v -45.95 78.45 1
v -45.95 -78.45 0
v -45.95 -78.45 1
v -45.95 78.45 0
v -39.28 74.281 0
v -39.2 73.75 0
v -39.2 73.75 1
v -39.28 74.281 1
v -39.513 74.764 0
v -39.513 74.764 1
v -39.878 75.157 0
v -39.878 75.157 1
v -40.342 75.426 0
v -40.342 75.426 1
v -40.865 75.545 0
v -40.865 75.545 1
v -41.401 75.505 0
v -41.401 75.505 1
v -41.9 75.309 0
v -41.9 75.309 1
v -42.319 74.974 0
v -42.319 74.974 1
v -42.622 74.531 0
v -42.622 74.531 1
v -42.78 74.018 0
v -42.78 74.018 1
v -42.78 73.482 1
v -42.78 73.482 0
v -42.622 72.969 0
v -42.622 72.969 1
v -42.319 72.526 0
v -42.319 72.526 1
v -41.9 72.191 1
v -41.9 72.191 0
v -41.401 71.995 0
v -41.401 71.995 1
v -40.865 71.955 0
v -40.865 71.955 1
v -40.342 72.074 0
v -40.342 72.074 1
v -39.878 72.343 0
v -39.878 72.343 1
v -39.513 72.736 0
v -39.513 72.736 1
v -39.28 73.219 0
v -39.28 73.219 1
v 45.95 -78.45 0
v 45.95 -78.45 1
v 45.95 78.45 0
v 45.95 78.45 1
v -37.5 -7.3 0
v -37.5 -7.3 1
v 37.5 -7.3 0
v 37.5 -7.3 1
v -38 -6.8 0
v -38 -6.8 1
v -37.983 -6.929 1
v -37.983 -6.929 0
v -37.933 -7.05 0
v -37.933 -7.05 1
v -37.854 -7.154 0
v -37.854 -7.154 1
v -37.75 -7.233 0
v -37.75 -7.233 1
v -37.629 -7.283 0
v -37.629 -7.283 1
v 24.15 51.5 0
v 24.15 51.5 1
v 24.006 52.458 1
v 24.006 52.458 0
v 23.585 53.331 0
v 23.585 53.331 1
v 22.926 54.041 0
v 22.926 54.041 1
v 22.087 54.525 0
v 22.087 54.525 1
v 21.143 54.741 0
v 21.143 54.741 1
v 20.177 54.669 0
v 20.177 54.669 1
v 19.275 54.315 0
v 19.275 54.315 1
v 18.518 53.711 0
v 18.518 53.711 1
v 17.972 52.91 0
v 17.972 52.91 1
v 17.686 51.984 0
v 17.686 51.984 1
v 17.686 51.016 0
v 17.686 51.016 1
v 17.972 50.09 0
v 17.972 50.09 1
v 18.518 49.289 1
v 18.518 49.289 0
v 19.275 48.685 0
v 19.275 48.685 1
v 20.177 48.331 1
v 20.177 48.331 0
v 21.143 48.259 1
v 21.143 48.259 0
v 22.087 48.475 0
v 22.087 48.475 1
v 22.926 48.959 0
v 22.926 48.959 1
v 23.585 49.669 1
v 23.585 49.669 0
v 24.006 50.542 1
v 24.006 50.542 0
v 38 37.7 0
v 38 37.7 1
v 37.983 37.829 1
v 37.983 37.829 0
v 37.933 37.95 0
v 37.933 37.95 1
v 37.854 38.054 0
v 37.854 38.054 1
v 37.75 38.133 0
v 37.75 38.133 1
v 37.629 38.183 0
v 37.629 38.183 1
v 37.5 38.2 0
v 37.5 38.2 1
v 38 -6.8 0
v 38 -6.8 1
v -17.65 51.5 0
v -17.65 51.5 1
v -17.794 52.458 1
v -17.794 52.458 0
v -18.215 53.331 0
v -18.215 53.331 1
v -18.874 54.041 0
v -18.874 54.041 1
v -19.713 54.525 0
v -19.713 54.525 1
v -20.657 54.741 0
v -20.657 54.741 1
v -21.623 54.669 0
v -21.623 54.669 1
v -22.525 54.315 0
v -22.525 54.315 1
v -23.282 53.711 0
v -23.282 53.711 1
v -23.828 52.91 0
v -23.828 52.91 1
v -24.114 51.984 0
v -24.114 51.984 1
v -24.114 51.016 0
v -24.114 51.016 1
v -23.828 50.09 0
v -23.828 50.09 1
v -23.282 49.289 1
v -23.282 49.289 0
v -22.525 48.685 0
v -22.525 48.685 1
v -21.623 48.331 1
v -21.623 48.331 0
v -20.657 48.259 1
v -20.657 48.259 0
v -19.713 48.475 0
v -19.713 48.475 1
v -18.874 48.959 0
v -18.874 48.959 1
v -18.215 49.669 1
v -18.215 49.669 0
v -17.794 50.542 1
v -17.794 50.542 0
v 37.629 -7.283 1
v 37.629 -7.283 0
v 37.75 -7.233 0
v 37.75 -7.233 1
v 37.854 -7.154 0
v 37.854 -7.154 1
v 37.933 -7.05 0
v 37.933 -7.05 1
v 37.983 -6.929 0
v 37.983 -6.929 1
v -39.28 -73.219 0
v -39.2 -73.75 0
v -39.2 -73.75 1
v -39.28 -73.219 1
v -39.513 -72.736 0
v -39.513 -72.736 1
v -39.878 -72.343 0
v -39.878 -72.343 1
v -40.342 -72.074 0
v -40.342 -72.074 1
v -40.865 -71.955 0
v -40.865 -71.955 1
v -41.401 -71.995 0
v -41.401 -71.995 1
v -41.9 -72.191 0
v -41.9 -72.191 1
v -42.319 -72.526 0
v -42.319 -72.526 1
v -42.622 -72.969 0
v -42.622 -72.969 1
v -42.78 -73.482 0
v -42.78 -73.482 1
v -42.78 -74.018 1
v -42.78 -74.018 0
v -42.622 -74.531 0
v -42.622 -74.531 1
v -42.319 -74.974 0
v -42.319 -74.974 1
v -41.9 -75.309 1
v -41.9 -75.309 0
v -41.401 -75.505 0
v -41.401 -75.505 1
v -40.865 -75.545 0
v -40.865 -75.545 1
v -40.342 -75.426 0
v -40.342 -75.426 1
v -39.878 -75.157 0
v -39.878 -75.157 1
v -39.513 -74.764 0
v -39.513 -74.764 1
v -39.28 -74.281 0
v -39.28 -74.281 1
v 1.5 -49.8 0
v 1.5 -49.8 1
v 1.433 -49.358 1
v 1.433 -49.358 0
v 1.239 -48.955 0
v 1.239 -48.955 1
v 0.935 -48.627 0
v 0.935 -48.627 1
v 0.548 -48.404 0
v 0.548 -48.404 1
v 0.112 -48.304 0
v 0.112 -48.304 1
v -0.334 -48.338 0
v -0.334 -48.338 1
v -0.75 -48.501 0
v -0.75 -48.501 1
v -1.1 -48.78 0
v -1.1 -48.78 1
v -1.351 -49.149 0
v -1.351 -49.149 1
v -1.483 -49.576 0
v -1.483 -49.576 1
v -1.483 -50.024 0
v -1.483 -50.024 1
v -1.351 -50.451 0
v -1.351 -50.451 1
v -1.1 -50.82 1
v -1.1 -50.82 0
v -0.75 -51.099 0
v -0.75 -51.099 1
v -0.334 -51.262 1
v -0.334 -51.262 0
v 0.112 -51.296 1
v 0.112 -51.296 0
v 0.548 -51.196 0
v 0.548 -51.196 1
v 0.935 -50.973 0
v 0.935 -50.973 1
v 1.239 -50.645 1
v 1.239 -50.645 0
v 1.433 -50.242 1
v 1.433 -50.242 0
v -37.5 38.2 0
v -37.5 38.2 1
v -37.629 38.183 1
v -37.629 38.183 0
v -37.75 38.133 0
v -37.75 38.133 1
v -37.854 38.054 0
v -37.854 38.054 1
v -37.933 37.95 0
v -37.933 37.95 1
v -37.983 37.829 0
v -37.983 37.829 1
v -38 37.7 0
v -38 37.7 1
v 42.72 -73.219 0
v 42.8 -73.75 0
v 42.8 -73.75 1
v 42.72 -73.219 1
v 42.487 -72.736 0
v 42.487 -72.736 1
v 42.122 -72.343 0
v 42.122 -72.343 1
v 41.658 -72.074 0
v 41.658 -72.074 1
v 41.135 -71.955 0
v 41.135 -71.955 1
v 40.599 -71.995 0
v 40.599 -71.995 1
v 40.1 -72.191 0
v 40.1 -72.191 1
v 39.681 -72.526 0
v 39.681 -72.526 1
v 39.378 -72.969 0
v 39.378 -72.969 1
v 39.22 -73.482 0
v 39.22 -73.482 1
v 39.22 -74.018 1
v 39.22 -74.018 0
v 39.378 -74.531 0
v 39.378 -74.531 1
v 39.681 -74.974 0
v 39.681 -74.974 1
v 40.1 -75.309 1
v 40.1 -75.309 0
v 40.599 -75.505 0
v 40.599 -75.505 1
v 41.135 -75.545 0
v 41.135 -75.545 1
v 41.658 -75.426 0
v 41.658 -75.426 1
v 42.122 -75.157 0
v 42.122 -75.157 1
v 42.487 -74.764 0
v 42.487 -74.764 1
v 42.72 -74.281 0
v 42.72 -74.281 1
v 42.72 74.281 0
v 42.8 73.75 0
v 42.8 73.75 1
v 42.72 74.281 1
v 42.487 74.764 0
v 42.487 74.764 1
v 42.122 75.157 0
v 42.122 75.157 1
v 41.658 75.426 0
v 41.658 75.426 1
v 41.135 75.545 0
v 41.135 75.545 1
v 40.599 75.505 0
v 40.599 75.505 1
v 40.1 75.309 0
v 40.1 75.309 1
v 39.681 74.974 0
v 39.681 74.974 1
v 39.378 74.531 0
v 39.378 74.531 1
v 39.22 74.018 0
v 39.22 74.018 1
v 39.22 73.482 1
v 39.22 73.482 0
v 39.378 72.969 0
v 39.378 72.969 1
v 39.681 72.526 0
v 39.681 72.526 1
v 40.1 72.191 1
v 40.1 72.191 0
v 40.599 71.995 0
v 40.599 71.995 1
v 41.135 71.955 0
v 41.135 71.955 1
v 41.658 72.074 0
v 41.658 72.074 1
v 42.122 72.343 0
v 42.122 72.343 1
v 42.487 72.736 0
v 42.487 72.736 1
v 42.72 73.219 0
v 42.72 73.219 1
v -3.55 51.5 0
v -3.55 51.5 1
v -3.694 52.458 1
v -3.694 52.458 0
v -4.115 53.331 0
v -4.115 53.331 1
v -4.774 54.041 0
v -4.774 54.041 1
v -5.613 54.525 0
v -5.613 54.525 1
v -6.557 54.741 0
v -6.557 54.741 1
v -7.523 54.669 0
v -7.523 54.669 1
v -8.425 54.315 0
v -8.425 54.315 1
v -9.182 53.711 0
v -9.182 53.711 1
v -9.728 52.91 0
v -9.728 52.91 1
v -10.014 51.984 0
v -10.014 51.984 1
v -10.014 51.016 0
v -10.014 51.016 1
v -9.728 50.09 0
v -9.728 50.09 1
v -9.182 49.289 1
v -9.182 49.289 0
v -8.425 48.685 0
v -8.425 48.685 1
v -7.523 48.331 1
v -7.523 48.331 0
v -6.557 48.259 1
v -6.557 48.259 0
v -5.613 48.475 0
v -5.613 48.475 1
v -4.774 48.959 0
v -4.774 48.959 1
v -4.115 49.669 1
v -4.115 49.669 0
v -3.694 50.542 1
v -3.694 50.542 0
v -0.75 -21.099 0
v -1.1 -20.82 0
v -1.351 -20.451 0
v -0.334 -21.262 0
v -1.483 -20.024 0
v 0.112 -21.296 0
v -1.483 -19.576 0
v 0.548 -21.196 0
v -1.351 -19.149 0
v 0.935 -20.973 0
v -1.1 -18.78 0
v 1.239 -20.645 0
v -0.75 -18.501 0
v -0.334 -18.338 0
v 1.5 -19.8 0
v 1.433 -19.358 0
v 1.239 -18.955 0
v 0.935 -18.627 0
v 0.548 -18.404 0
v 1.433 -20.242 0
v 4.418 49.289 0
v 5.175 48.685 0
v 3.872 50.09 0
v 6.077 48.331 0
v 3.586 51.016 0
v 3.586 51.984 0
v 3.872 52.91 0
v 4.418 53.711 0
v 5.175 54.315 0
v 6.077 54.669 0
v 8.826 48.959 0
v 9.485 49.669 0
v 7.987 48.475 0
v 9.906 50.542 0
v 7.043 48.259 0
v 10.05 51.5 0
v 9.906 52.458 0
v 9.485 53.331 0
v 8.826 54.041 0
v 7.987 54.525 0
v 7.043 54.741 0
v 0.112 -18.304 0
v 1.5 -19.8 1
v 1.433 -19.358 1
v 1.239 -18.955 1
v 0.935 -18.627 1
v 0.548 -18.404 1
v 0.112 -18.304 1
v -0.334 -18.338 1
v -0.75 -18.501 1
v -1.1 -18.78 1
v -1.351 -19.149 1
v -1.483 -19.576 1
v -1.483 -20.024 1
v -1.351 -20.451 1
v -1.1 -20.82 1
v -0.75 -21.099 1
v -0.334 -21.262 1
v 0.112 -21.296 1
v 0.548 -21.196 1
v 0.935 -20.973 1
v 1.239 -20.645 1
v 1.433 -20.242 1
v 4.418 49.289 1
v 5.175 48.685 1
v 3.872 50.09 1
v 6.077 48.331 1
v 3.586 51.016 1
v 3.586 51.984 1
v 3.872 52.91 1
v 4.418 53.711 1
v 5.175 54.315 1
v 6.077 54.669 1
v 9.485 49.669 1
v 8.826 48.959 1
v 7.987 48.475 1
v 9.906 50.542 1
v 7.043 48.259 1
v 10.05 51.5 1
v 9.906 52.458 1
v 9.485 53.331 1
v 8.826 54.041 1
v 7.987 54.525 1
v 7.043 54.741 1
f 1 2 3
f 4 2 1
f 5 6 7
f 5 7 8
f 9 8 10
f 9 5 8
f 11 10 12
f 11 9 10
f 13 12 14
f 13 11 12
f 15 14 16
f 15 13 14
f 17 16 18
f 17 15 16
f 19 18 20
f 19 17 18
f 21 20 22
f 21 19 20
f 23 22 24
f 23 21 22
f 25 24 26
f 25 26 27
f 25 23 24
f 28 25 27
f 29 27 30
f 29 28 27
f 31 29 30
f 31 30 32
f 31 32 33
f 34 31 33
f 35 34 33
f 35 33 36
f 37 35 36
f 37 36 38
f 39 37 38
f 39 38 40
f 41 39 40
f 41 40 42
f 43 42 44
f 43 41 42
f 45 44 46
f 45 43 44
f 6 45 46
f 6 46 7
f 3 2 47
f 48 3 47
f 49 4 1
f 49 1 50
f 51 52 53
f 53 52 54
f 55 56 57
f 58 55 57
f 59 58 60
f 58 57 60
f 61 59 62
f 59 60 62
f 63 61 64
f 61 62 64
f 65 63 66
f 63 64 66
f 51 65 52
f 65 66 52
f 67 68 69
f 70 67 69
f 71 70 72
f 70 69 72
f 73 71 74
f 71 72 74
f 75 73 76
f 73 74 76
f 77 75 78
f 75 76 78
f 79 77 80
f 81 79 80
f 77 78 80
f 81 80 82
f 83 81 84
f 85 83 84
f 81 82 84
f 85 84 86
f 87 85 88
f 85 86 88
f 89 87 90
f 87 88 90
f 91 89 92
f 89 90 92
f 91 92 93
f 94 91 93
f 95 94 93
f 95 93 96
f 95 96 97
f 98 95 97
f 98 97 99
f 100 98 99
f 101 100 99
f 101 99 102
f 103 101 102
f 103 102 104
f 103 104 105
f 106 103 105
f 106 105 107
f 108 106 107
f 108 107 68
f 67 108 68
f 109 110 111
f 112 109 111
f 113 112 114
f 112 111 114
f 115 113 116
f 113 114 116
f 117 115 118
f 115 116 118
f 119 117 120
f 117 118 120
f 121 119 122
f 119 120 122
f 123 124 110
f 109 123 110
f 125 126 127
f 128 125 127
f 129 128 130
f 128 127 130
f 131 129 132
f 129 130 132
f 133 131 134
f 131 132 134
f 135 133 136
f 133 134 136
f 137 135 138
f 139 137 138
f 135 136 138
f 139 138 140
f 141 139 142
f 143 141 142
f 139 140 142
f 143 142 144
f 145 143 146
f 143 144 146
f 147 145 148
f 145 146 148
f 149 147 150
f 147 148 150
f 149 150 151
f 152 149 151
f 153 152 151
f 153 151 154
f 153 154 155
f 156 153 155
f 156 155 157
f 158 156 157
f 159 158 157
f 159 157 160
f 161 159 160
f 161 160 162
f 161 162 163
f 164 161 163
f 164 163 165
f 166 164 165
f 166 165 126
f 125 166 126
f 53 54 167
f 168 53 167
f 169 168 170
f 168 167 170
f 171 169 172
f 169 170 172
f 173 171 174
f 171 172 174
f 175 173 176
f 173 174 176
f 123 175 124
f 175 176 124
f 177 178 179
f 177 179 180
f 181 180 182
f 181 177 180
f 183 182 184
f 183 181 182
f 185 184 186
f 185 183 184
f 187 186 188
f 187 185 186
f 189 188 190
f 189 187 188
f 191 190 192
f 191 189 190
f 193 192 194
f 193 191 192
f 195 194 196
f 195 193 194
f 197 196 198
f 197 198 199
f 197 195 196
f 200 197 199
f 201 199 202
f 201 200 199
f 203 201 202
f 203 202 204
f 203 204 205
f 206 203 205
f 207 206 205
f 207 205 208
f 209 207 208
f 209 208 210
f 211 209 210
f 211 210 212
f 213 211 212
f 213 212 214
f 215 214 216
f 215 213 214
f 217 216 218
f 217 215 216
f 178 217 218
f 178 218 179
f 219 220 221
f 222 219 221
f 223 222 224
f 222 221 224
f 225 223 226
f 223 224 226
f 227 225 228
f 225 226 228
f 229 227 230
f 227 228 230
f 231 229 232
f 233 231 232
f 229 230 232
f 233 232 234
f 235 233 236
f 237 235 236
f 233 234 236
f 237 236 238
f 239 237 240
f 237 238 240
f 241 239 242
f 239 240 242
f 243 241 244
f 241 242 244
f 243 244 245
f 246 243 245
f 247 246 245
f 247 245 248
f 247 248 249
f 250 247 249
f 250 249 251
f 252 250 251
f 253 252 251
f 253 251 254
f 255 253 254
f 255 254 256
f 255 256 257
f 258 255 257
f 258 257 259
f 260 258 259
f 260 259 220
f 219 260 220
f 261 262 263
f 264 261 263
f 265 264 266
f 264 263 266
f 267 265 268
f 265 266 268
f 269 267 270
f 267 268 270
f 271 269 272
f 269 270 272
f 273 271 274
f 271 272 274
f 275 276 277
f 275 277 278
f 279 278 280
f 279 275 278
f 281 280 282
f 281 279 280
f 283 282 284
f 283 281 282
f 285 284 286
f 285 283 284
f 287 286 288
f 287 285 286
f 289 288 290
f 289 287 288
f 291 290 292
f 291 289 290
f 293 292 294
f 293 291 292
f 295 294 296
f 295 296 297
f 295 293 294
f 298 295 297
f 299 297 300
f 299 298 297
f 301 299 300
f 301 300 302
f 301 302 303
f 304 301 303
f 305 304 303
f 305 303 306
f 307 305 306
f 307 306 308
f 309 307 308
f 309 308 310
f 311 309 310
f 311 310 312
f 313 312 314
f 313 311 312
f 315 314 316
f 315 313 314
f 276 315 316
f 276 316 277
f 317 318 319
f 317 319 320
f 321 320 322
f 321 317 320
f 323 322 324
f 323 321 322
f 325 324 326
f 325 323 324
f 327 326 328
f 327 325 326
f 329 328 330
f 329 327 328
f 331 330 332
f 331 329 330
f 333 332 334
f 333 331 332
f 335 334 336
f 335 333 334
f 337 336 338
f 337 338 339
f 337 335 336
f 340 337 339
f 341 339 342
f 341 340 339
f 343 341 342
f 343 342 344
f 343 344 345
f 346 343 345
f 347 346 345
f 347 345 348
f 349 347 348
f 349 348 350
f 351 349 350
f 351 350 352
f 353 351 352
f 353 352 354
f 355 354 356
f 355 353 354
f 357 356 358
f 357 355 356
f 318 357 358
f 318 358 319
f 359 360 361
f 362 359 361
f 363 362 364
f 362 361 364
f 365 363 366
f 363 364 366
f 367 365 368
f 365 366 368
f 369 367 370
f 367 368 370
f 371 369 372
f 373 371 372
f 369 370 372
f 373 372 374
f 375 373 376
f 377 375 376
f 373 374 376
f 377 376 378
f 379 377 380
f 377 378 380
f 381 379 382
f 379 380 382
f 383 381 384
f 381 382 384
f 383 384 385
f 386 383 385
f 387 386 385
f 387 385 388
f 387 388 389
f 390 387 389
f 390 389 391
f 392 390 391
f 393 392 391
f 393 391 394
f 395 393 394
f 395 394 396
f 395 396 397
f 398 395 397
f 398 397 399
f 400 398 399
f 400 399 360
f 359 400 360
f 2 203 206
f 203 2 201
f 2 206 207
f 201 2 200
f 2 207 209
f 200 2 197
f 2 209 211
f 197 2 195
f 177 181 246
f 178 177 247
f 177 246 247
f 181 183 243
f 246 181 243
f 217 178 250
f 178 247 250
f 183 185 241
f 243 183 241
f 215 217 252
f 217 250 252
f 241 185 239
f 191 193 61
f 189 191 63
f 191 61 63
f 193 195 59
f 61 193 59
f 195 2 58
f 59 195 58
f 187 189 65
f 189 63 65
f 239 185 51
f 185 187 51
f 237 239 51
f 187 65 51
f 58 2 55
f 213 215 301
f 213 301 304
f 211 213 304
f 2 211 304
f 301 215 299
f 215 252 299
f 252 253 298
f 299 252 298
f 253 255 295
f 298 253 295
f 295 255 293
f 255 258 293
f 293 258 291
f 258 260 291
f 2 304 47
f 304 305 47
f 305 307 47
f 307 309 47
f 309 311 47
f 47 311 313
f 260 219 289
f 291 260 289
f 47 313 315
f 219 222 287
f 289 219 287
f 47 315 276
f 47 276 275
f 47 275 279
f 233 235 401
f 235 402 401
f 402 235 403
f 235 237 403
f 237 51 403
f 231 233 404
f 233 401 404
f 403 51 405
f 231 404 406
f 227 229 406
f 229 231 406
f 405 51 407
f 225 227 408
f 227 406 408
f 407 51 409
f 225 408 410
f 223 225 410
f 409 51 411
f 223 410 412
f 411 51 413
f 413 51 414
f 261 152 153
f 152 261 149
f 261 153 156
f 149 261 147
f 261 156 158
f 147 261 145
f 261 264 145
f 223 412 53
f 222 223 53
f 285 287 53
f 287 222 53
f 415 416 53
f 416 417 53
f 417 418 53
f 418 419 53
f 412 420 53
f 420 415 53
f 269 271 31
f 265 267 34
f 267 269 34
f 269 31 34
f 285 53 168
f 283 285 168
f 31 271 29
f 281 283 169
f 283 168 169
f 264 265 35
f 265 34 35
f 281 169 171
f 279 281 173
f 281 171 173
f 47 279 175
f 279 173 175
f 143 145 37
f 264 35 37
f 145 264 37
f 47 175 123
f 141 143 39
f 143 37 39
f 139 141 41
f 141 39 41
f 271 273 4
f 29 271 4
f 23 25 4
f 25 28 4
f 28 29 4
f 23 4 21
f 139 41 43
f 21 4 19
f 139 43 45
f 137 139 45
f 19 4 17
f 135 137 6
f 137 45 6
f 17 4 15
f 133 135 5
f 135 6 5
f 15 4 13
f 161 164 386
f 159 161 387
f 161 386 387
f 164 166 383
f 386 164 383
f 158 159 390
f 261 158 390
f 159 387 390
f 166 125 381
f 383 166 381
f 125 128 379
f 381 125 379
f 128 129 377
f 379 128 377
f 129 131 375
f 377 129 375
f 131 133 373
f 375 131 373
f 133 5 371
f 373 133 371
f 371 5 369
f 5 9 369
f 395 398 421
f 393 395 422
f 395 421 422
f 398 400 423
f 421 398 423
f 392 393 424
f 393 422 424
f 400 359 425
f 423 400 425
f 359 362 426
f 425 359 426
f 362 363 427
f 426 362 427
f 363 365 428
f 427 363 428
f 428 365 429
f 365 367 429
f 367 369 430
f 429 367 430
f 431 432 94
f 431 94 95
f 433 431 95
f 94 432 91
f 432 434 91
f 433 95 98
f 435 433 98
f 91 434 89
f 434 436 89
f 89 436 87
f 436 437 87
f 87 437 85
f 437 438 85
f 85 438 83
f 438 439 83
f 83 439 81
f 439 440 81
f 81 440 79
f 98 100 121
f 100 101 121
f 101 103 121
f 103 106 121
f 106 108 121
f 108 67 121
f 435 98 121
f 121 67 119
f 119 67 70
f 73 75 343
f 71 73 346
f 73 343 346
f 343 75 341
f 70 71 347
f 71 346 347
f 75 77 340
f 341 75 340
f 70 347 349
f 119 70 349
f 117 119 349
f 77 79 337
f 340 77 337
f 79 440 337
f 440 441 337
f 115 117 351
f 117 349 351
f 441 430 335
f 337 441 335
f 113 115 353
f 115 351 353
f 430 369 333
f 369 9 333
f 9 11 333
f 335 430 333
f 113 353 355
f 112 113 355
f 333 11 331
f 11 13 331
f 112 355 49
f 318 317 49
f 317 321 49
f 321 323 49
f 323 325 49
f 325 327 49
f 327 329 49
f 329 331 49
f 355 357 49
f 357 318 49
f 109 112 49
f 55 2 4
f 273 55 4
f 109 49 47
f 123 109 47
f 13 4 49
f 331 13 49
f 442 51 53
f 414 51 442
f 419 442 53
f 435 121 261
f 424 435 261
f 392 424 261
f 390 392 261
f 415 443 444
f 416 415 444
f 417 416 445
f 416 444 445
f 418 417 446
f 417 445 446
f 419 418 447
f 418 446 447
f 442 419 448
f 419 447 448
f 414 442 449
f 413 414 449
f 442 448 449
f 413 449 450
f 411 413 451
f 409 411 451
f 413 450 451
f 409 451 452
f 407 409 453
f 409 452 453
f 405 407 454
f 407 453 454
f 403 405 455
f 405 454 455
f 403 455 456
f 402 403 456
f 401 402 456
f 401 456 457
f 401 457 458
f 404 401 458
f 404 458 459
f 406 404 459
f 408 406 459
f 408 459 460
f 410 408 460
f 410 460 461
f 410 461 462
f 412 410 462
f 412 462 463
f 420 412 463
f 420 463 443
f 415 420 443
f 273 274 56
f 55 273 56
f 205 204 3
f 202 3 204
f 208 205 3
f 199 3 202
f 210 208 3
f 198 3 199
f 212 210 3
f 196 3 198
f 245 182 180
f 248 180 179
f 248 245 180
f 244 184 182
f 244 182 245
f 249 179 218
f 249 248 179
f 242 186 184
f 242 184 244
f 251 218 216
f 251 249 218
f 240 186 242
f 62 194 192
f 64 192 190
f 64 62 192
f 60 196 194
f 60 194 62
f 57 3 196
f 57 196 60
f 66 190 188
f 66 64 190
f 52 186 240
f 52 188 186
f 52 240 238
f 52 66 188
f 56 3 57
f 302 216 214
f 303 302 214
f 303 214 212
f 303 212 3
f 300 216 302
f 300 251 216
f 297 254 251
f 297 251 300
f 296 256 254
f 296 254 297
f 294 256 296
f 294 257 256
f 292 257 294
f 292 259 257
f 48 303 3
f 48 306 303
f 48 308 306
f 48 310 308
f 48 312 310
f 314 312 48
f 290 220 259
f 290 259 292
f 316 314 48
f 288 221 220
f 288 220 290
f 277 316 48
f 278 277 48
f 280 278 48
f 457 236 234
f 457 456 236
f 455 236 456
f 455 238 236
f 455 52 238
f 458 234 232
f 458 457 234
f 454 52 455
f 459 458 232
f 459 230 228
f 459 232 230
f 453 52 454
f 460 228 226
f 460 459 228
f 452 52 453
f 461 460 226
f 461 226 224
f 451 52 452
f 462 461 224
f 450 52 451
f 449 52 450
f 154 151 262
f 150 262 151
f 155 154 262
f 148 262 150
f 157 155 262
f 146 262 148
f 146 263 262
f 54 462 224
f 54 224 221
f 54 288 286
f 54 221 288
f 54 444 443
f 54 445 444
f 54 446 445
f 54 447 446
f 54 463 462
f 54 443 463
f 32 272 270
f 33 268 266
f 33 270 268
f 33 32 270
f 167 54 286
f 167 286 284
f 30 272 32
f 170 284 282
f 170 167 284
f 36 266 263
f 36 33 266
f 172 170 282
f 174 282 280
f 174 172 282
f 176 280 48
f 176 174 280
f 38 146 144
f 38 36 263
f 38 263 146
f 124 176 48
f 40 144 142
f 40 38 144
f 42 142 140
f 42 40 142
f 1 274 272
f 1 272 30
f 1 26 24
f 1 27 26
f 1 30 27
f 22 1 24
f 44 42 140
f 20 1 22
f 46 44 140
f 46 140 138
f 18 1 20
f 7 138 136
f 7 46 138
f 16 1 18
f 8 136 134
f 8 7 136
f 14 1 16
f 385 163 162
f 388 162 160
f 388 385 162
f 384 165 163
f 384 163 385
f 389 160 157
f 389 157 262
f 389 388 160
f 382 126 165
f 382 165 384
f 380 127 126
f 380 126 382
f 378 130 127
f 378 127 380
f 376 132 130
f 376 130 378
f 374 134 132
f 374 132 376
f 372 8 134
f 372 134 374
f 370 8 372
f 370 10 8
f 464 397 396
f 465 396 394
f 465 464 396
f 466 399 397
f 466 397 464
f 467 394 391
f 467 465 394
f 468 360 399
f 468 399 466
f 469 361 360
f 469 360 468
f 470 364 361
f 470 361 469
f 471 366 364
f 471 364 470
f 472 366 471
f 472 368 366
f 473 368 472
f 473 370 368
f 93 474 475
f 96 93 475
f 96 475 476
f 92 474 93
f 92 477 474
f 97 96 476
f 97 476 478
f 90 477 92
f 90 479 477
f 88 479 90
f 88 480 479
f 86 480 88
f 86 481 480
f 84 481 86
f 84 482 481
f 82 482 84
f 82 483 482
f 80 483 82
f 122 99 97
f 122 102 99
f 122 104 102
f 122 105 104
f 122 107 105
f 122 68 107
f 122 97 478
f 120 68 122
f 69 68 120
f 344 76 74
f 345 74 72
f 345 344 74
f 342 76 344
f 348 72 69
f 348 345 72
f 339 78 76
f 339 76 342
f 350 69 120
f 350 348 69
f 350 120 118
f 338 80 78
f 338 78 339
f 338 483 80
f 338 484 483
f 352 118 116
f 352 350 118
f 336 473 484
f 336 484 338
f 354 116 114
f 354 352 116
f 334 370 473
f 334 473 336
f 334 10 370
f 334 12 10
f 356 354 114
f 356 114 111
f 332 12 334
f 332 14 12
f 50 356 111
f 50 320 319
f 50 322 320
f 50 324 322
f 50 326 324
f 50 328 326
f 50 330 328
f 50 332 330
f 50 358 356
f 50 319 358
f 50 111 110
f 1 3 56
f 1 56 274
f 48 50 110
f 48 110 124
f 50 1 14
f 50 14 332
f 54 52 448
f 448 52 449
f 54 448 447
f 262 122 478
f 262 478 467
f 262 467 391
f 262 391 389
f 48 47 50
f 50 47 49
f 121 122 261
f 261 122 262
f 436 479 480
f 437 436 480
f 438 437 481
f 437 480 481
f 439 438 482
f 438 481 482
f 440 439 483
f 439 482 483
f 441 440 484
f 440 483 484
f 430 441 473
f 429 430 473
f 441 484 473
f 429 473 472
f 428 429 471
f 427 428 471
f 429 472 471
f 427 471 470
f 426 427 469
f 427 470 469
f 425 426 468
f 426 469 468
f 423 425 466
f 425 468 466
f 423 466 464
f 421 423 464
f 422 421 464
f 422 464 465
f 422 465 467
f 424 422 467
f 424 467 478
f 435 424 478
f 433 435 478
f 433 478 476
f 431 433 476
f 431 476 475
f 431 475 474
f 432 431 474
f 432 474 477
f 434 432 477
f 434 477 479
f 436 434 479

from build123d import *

# Parameters (mm, degrees)
F0_W     = 91.9
F0_H     = 156.9
F0_R     = 1.8
F1_DEPTH = 1
F2_R     = 3.25
F2_R_2   = 1.5
F3_DEPTH = 2


with BuildPart() as f1:
    # F0 (on Top) → F1 (new body)
    with BuildSketch(Plane.XY):
        Rectangle(F0_W, F0_H)
        with Locations((-41, -73.75)):
            Circle(F0_R, mode=Mode.SUBTRACT)
        with Locations((41, -73.75)):
            Circle(F0_R, mode=Mode.SUBTRACT)
        with Locations((-41, 73.75)):
            Circle(F0_R, mode=Mode.SUBTRACT)
        with Locations((41, 73.75)):
            Circle(F0_R, mode=Mode.SUBTRACT)
    extrude(amount=F1_DEPTH)

    # F2 (on face) → F3 (cut)
    with BuildSketch(Plane.XY.offset(1)):
        with Locations((20.9, 51.5)):
            Circle(F2_R)
        with Locations((-20.9, 51.5)):
            Circle(F2_R)
        with Locations((6.8, 51.5)):
            Circle(F2_R)
        with Locations((-6.8, 51.5)):
            Circle(F2_R)
        with BuildLine():
            Line((-37.5, -7.299998), (37.5, -7.299998))
            ThreePointArc((37.5, -7.299998), (37.853553, -7.153552), (38, -6.799998))
            Line((38, -6.799998), (38, 37.700002))
            ThreePointArc((38, 37.700002), (37.853553, 38.053555), (37.5, 38.200002))
            Line((37.5, 38.200002), (-37.5, 38.200002))
            ThreePointArc((-37.5, 38.200002), (-37.853553, 38.053555), (-38, 37.700002))
            Line((-38, 37.700002), (-38, -6.799998))
            ThreePointArc((-38, -6.799998), (-37.853553, -7.153552), (-37.5, -7.299998))
        make_face()
        with Locations((0, -19.799998)):
            Circle(F2_R_2)
        with Locations((0, -49.799998)):
            Circle(F2_R_2)
    extrude(amount=-F3_DEPTH, mode=Mode.SUBTRACT)


solid = f1.part
